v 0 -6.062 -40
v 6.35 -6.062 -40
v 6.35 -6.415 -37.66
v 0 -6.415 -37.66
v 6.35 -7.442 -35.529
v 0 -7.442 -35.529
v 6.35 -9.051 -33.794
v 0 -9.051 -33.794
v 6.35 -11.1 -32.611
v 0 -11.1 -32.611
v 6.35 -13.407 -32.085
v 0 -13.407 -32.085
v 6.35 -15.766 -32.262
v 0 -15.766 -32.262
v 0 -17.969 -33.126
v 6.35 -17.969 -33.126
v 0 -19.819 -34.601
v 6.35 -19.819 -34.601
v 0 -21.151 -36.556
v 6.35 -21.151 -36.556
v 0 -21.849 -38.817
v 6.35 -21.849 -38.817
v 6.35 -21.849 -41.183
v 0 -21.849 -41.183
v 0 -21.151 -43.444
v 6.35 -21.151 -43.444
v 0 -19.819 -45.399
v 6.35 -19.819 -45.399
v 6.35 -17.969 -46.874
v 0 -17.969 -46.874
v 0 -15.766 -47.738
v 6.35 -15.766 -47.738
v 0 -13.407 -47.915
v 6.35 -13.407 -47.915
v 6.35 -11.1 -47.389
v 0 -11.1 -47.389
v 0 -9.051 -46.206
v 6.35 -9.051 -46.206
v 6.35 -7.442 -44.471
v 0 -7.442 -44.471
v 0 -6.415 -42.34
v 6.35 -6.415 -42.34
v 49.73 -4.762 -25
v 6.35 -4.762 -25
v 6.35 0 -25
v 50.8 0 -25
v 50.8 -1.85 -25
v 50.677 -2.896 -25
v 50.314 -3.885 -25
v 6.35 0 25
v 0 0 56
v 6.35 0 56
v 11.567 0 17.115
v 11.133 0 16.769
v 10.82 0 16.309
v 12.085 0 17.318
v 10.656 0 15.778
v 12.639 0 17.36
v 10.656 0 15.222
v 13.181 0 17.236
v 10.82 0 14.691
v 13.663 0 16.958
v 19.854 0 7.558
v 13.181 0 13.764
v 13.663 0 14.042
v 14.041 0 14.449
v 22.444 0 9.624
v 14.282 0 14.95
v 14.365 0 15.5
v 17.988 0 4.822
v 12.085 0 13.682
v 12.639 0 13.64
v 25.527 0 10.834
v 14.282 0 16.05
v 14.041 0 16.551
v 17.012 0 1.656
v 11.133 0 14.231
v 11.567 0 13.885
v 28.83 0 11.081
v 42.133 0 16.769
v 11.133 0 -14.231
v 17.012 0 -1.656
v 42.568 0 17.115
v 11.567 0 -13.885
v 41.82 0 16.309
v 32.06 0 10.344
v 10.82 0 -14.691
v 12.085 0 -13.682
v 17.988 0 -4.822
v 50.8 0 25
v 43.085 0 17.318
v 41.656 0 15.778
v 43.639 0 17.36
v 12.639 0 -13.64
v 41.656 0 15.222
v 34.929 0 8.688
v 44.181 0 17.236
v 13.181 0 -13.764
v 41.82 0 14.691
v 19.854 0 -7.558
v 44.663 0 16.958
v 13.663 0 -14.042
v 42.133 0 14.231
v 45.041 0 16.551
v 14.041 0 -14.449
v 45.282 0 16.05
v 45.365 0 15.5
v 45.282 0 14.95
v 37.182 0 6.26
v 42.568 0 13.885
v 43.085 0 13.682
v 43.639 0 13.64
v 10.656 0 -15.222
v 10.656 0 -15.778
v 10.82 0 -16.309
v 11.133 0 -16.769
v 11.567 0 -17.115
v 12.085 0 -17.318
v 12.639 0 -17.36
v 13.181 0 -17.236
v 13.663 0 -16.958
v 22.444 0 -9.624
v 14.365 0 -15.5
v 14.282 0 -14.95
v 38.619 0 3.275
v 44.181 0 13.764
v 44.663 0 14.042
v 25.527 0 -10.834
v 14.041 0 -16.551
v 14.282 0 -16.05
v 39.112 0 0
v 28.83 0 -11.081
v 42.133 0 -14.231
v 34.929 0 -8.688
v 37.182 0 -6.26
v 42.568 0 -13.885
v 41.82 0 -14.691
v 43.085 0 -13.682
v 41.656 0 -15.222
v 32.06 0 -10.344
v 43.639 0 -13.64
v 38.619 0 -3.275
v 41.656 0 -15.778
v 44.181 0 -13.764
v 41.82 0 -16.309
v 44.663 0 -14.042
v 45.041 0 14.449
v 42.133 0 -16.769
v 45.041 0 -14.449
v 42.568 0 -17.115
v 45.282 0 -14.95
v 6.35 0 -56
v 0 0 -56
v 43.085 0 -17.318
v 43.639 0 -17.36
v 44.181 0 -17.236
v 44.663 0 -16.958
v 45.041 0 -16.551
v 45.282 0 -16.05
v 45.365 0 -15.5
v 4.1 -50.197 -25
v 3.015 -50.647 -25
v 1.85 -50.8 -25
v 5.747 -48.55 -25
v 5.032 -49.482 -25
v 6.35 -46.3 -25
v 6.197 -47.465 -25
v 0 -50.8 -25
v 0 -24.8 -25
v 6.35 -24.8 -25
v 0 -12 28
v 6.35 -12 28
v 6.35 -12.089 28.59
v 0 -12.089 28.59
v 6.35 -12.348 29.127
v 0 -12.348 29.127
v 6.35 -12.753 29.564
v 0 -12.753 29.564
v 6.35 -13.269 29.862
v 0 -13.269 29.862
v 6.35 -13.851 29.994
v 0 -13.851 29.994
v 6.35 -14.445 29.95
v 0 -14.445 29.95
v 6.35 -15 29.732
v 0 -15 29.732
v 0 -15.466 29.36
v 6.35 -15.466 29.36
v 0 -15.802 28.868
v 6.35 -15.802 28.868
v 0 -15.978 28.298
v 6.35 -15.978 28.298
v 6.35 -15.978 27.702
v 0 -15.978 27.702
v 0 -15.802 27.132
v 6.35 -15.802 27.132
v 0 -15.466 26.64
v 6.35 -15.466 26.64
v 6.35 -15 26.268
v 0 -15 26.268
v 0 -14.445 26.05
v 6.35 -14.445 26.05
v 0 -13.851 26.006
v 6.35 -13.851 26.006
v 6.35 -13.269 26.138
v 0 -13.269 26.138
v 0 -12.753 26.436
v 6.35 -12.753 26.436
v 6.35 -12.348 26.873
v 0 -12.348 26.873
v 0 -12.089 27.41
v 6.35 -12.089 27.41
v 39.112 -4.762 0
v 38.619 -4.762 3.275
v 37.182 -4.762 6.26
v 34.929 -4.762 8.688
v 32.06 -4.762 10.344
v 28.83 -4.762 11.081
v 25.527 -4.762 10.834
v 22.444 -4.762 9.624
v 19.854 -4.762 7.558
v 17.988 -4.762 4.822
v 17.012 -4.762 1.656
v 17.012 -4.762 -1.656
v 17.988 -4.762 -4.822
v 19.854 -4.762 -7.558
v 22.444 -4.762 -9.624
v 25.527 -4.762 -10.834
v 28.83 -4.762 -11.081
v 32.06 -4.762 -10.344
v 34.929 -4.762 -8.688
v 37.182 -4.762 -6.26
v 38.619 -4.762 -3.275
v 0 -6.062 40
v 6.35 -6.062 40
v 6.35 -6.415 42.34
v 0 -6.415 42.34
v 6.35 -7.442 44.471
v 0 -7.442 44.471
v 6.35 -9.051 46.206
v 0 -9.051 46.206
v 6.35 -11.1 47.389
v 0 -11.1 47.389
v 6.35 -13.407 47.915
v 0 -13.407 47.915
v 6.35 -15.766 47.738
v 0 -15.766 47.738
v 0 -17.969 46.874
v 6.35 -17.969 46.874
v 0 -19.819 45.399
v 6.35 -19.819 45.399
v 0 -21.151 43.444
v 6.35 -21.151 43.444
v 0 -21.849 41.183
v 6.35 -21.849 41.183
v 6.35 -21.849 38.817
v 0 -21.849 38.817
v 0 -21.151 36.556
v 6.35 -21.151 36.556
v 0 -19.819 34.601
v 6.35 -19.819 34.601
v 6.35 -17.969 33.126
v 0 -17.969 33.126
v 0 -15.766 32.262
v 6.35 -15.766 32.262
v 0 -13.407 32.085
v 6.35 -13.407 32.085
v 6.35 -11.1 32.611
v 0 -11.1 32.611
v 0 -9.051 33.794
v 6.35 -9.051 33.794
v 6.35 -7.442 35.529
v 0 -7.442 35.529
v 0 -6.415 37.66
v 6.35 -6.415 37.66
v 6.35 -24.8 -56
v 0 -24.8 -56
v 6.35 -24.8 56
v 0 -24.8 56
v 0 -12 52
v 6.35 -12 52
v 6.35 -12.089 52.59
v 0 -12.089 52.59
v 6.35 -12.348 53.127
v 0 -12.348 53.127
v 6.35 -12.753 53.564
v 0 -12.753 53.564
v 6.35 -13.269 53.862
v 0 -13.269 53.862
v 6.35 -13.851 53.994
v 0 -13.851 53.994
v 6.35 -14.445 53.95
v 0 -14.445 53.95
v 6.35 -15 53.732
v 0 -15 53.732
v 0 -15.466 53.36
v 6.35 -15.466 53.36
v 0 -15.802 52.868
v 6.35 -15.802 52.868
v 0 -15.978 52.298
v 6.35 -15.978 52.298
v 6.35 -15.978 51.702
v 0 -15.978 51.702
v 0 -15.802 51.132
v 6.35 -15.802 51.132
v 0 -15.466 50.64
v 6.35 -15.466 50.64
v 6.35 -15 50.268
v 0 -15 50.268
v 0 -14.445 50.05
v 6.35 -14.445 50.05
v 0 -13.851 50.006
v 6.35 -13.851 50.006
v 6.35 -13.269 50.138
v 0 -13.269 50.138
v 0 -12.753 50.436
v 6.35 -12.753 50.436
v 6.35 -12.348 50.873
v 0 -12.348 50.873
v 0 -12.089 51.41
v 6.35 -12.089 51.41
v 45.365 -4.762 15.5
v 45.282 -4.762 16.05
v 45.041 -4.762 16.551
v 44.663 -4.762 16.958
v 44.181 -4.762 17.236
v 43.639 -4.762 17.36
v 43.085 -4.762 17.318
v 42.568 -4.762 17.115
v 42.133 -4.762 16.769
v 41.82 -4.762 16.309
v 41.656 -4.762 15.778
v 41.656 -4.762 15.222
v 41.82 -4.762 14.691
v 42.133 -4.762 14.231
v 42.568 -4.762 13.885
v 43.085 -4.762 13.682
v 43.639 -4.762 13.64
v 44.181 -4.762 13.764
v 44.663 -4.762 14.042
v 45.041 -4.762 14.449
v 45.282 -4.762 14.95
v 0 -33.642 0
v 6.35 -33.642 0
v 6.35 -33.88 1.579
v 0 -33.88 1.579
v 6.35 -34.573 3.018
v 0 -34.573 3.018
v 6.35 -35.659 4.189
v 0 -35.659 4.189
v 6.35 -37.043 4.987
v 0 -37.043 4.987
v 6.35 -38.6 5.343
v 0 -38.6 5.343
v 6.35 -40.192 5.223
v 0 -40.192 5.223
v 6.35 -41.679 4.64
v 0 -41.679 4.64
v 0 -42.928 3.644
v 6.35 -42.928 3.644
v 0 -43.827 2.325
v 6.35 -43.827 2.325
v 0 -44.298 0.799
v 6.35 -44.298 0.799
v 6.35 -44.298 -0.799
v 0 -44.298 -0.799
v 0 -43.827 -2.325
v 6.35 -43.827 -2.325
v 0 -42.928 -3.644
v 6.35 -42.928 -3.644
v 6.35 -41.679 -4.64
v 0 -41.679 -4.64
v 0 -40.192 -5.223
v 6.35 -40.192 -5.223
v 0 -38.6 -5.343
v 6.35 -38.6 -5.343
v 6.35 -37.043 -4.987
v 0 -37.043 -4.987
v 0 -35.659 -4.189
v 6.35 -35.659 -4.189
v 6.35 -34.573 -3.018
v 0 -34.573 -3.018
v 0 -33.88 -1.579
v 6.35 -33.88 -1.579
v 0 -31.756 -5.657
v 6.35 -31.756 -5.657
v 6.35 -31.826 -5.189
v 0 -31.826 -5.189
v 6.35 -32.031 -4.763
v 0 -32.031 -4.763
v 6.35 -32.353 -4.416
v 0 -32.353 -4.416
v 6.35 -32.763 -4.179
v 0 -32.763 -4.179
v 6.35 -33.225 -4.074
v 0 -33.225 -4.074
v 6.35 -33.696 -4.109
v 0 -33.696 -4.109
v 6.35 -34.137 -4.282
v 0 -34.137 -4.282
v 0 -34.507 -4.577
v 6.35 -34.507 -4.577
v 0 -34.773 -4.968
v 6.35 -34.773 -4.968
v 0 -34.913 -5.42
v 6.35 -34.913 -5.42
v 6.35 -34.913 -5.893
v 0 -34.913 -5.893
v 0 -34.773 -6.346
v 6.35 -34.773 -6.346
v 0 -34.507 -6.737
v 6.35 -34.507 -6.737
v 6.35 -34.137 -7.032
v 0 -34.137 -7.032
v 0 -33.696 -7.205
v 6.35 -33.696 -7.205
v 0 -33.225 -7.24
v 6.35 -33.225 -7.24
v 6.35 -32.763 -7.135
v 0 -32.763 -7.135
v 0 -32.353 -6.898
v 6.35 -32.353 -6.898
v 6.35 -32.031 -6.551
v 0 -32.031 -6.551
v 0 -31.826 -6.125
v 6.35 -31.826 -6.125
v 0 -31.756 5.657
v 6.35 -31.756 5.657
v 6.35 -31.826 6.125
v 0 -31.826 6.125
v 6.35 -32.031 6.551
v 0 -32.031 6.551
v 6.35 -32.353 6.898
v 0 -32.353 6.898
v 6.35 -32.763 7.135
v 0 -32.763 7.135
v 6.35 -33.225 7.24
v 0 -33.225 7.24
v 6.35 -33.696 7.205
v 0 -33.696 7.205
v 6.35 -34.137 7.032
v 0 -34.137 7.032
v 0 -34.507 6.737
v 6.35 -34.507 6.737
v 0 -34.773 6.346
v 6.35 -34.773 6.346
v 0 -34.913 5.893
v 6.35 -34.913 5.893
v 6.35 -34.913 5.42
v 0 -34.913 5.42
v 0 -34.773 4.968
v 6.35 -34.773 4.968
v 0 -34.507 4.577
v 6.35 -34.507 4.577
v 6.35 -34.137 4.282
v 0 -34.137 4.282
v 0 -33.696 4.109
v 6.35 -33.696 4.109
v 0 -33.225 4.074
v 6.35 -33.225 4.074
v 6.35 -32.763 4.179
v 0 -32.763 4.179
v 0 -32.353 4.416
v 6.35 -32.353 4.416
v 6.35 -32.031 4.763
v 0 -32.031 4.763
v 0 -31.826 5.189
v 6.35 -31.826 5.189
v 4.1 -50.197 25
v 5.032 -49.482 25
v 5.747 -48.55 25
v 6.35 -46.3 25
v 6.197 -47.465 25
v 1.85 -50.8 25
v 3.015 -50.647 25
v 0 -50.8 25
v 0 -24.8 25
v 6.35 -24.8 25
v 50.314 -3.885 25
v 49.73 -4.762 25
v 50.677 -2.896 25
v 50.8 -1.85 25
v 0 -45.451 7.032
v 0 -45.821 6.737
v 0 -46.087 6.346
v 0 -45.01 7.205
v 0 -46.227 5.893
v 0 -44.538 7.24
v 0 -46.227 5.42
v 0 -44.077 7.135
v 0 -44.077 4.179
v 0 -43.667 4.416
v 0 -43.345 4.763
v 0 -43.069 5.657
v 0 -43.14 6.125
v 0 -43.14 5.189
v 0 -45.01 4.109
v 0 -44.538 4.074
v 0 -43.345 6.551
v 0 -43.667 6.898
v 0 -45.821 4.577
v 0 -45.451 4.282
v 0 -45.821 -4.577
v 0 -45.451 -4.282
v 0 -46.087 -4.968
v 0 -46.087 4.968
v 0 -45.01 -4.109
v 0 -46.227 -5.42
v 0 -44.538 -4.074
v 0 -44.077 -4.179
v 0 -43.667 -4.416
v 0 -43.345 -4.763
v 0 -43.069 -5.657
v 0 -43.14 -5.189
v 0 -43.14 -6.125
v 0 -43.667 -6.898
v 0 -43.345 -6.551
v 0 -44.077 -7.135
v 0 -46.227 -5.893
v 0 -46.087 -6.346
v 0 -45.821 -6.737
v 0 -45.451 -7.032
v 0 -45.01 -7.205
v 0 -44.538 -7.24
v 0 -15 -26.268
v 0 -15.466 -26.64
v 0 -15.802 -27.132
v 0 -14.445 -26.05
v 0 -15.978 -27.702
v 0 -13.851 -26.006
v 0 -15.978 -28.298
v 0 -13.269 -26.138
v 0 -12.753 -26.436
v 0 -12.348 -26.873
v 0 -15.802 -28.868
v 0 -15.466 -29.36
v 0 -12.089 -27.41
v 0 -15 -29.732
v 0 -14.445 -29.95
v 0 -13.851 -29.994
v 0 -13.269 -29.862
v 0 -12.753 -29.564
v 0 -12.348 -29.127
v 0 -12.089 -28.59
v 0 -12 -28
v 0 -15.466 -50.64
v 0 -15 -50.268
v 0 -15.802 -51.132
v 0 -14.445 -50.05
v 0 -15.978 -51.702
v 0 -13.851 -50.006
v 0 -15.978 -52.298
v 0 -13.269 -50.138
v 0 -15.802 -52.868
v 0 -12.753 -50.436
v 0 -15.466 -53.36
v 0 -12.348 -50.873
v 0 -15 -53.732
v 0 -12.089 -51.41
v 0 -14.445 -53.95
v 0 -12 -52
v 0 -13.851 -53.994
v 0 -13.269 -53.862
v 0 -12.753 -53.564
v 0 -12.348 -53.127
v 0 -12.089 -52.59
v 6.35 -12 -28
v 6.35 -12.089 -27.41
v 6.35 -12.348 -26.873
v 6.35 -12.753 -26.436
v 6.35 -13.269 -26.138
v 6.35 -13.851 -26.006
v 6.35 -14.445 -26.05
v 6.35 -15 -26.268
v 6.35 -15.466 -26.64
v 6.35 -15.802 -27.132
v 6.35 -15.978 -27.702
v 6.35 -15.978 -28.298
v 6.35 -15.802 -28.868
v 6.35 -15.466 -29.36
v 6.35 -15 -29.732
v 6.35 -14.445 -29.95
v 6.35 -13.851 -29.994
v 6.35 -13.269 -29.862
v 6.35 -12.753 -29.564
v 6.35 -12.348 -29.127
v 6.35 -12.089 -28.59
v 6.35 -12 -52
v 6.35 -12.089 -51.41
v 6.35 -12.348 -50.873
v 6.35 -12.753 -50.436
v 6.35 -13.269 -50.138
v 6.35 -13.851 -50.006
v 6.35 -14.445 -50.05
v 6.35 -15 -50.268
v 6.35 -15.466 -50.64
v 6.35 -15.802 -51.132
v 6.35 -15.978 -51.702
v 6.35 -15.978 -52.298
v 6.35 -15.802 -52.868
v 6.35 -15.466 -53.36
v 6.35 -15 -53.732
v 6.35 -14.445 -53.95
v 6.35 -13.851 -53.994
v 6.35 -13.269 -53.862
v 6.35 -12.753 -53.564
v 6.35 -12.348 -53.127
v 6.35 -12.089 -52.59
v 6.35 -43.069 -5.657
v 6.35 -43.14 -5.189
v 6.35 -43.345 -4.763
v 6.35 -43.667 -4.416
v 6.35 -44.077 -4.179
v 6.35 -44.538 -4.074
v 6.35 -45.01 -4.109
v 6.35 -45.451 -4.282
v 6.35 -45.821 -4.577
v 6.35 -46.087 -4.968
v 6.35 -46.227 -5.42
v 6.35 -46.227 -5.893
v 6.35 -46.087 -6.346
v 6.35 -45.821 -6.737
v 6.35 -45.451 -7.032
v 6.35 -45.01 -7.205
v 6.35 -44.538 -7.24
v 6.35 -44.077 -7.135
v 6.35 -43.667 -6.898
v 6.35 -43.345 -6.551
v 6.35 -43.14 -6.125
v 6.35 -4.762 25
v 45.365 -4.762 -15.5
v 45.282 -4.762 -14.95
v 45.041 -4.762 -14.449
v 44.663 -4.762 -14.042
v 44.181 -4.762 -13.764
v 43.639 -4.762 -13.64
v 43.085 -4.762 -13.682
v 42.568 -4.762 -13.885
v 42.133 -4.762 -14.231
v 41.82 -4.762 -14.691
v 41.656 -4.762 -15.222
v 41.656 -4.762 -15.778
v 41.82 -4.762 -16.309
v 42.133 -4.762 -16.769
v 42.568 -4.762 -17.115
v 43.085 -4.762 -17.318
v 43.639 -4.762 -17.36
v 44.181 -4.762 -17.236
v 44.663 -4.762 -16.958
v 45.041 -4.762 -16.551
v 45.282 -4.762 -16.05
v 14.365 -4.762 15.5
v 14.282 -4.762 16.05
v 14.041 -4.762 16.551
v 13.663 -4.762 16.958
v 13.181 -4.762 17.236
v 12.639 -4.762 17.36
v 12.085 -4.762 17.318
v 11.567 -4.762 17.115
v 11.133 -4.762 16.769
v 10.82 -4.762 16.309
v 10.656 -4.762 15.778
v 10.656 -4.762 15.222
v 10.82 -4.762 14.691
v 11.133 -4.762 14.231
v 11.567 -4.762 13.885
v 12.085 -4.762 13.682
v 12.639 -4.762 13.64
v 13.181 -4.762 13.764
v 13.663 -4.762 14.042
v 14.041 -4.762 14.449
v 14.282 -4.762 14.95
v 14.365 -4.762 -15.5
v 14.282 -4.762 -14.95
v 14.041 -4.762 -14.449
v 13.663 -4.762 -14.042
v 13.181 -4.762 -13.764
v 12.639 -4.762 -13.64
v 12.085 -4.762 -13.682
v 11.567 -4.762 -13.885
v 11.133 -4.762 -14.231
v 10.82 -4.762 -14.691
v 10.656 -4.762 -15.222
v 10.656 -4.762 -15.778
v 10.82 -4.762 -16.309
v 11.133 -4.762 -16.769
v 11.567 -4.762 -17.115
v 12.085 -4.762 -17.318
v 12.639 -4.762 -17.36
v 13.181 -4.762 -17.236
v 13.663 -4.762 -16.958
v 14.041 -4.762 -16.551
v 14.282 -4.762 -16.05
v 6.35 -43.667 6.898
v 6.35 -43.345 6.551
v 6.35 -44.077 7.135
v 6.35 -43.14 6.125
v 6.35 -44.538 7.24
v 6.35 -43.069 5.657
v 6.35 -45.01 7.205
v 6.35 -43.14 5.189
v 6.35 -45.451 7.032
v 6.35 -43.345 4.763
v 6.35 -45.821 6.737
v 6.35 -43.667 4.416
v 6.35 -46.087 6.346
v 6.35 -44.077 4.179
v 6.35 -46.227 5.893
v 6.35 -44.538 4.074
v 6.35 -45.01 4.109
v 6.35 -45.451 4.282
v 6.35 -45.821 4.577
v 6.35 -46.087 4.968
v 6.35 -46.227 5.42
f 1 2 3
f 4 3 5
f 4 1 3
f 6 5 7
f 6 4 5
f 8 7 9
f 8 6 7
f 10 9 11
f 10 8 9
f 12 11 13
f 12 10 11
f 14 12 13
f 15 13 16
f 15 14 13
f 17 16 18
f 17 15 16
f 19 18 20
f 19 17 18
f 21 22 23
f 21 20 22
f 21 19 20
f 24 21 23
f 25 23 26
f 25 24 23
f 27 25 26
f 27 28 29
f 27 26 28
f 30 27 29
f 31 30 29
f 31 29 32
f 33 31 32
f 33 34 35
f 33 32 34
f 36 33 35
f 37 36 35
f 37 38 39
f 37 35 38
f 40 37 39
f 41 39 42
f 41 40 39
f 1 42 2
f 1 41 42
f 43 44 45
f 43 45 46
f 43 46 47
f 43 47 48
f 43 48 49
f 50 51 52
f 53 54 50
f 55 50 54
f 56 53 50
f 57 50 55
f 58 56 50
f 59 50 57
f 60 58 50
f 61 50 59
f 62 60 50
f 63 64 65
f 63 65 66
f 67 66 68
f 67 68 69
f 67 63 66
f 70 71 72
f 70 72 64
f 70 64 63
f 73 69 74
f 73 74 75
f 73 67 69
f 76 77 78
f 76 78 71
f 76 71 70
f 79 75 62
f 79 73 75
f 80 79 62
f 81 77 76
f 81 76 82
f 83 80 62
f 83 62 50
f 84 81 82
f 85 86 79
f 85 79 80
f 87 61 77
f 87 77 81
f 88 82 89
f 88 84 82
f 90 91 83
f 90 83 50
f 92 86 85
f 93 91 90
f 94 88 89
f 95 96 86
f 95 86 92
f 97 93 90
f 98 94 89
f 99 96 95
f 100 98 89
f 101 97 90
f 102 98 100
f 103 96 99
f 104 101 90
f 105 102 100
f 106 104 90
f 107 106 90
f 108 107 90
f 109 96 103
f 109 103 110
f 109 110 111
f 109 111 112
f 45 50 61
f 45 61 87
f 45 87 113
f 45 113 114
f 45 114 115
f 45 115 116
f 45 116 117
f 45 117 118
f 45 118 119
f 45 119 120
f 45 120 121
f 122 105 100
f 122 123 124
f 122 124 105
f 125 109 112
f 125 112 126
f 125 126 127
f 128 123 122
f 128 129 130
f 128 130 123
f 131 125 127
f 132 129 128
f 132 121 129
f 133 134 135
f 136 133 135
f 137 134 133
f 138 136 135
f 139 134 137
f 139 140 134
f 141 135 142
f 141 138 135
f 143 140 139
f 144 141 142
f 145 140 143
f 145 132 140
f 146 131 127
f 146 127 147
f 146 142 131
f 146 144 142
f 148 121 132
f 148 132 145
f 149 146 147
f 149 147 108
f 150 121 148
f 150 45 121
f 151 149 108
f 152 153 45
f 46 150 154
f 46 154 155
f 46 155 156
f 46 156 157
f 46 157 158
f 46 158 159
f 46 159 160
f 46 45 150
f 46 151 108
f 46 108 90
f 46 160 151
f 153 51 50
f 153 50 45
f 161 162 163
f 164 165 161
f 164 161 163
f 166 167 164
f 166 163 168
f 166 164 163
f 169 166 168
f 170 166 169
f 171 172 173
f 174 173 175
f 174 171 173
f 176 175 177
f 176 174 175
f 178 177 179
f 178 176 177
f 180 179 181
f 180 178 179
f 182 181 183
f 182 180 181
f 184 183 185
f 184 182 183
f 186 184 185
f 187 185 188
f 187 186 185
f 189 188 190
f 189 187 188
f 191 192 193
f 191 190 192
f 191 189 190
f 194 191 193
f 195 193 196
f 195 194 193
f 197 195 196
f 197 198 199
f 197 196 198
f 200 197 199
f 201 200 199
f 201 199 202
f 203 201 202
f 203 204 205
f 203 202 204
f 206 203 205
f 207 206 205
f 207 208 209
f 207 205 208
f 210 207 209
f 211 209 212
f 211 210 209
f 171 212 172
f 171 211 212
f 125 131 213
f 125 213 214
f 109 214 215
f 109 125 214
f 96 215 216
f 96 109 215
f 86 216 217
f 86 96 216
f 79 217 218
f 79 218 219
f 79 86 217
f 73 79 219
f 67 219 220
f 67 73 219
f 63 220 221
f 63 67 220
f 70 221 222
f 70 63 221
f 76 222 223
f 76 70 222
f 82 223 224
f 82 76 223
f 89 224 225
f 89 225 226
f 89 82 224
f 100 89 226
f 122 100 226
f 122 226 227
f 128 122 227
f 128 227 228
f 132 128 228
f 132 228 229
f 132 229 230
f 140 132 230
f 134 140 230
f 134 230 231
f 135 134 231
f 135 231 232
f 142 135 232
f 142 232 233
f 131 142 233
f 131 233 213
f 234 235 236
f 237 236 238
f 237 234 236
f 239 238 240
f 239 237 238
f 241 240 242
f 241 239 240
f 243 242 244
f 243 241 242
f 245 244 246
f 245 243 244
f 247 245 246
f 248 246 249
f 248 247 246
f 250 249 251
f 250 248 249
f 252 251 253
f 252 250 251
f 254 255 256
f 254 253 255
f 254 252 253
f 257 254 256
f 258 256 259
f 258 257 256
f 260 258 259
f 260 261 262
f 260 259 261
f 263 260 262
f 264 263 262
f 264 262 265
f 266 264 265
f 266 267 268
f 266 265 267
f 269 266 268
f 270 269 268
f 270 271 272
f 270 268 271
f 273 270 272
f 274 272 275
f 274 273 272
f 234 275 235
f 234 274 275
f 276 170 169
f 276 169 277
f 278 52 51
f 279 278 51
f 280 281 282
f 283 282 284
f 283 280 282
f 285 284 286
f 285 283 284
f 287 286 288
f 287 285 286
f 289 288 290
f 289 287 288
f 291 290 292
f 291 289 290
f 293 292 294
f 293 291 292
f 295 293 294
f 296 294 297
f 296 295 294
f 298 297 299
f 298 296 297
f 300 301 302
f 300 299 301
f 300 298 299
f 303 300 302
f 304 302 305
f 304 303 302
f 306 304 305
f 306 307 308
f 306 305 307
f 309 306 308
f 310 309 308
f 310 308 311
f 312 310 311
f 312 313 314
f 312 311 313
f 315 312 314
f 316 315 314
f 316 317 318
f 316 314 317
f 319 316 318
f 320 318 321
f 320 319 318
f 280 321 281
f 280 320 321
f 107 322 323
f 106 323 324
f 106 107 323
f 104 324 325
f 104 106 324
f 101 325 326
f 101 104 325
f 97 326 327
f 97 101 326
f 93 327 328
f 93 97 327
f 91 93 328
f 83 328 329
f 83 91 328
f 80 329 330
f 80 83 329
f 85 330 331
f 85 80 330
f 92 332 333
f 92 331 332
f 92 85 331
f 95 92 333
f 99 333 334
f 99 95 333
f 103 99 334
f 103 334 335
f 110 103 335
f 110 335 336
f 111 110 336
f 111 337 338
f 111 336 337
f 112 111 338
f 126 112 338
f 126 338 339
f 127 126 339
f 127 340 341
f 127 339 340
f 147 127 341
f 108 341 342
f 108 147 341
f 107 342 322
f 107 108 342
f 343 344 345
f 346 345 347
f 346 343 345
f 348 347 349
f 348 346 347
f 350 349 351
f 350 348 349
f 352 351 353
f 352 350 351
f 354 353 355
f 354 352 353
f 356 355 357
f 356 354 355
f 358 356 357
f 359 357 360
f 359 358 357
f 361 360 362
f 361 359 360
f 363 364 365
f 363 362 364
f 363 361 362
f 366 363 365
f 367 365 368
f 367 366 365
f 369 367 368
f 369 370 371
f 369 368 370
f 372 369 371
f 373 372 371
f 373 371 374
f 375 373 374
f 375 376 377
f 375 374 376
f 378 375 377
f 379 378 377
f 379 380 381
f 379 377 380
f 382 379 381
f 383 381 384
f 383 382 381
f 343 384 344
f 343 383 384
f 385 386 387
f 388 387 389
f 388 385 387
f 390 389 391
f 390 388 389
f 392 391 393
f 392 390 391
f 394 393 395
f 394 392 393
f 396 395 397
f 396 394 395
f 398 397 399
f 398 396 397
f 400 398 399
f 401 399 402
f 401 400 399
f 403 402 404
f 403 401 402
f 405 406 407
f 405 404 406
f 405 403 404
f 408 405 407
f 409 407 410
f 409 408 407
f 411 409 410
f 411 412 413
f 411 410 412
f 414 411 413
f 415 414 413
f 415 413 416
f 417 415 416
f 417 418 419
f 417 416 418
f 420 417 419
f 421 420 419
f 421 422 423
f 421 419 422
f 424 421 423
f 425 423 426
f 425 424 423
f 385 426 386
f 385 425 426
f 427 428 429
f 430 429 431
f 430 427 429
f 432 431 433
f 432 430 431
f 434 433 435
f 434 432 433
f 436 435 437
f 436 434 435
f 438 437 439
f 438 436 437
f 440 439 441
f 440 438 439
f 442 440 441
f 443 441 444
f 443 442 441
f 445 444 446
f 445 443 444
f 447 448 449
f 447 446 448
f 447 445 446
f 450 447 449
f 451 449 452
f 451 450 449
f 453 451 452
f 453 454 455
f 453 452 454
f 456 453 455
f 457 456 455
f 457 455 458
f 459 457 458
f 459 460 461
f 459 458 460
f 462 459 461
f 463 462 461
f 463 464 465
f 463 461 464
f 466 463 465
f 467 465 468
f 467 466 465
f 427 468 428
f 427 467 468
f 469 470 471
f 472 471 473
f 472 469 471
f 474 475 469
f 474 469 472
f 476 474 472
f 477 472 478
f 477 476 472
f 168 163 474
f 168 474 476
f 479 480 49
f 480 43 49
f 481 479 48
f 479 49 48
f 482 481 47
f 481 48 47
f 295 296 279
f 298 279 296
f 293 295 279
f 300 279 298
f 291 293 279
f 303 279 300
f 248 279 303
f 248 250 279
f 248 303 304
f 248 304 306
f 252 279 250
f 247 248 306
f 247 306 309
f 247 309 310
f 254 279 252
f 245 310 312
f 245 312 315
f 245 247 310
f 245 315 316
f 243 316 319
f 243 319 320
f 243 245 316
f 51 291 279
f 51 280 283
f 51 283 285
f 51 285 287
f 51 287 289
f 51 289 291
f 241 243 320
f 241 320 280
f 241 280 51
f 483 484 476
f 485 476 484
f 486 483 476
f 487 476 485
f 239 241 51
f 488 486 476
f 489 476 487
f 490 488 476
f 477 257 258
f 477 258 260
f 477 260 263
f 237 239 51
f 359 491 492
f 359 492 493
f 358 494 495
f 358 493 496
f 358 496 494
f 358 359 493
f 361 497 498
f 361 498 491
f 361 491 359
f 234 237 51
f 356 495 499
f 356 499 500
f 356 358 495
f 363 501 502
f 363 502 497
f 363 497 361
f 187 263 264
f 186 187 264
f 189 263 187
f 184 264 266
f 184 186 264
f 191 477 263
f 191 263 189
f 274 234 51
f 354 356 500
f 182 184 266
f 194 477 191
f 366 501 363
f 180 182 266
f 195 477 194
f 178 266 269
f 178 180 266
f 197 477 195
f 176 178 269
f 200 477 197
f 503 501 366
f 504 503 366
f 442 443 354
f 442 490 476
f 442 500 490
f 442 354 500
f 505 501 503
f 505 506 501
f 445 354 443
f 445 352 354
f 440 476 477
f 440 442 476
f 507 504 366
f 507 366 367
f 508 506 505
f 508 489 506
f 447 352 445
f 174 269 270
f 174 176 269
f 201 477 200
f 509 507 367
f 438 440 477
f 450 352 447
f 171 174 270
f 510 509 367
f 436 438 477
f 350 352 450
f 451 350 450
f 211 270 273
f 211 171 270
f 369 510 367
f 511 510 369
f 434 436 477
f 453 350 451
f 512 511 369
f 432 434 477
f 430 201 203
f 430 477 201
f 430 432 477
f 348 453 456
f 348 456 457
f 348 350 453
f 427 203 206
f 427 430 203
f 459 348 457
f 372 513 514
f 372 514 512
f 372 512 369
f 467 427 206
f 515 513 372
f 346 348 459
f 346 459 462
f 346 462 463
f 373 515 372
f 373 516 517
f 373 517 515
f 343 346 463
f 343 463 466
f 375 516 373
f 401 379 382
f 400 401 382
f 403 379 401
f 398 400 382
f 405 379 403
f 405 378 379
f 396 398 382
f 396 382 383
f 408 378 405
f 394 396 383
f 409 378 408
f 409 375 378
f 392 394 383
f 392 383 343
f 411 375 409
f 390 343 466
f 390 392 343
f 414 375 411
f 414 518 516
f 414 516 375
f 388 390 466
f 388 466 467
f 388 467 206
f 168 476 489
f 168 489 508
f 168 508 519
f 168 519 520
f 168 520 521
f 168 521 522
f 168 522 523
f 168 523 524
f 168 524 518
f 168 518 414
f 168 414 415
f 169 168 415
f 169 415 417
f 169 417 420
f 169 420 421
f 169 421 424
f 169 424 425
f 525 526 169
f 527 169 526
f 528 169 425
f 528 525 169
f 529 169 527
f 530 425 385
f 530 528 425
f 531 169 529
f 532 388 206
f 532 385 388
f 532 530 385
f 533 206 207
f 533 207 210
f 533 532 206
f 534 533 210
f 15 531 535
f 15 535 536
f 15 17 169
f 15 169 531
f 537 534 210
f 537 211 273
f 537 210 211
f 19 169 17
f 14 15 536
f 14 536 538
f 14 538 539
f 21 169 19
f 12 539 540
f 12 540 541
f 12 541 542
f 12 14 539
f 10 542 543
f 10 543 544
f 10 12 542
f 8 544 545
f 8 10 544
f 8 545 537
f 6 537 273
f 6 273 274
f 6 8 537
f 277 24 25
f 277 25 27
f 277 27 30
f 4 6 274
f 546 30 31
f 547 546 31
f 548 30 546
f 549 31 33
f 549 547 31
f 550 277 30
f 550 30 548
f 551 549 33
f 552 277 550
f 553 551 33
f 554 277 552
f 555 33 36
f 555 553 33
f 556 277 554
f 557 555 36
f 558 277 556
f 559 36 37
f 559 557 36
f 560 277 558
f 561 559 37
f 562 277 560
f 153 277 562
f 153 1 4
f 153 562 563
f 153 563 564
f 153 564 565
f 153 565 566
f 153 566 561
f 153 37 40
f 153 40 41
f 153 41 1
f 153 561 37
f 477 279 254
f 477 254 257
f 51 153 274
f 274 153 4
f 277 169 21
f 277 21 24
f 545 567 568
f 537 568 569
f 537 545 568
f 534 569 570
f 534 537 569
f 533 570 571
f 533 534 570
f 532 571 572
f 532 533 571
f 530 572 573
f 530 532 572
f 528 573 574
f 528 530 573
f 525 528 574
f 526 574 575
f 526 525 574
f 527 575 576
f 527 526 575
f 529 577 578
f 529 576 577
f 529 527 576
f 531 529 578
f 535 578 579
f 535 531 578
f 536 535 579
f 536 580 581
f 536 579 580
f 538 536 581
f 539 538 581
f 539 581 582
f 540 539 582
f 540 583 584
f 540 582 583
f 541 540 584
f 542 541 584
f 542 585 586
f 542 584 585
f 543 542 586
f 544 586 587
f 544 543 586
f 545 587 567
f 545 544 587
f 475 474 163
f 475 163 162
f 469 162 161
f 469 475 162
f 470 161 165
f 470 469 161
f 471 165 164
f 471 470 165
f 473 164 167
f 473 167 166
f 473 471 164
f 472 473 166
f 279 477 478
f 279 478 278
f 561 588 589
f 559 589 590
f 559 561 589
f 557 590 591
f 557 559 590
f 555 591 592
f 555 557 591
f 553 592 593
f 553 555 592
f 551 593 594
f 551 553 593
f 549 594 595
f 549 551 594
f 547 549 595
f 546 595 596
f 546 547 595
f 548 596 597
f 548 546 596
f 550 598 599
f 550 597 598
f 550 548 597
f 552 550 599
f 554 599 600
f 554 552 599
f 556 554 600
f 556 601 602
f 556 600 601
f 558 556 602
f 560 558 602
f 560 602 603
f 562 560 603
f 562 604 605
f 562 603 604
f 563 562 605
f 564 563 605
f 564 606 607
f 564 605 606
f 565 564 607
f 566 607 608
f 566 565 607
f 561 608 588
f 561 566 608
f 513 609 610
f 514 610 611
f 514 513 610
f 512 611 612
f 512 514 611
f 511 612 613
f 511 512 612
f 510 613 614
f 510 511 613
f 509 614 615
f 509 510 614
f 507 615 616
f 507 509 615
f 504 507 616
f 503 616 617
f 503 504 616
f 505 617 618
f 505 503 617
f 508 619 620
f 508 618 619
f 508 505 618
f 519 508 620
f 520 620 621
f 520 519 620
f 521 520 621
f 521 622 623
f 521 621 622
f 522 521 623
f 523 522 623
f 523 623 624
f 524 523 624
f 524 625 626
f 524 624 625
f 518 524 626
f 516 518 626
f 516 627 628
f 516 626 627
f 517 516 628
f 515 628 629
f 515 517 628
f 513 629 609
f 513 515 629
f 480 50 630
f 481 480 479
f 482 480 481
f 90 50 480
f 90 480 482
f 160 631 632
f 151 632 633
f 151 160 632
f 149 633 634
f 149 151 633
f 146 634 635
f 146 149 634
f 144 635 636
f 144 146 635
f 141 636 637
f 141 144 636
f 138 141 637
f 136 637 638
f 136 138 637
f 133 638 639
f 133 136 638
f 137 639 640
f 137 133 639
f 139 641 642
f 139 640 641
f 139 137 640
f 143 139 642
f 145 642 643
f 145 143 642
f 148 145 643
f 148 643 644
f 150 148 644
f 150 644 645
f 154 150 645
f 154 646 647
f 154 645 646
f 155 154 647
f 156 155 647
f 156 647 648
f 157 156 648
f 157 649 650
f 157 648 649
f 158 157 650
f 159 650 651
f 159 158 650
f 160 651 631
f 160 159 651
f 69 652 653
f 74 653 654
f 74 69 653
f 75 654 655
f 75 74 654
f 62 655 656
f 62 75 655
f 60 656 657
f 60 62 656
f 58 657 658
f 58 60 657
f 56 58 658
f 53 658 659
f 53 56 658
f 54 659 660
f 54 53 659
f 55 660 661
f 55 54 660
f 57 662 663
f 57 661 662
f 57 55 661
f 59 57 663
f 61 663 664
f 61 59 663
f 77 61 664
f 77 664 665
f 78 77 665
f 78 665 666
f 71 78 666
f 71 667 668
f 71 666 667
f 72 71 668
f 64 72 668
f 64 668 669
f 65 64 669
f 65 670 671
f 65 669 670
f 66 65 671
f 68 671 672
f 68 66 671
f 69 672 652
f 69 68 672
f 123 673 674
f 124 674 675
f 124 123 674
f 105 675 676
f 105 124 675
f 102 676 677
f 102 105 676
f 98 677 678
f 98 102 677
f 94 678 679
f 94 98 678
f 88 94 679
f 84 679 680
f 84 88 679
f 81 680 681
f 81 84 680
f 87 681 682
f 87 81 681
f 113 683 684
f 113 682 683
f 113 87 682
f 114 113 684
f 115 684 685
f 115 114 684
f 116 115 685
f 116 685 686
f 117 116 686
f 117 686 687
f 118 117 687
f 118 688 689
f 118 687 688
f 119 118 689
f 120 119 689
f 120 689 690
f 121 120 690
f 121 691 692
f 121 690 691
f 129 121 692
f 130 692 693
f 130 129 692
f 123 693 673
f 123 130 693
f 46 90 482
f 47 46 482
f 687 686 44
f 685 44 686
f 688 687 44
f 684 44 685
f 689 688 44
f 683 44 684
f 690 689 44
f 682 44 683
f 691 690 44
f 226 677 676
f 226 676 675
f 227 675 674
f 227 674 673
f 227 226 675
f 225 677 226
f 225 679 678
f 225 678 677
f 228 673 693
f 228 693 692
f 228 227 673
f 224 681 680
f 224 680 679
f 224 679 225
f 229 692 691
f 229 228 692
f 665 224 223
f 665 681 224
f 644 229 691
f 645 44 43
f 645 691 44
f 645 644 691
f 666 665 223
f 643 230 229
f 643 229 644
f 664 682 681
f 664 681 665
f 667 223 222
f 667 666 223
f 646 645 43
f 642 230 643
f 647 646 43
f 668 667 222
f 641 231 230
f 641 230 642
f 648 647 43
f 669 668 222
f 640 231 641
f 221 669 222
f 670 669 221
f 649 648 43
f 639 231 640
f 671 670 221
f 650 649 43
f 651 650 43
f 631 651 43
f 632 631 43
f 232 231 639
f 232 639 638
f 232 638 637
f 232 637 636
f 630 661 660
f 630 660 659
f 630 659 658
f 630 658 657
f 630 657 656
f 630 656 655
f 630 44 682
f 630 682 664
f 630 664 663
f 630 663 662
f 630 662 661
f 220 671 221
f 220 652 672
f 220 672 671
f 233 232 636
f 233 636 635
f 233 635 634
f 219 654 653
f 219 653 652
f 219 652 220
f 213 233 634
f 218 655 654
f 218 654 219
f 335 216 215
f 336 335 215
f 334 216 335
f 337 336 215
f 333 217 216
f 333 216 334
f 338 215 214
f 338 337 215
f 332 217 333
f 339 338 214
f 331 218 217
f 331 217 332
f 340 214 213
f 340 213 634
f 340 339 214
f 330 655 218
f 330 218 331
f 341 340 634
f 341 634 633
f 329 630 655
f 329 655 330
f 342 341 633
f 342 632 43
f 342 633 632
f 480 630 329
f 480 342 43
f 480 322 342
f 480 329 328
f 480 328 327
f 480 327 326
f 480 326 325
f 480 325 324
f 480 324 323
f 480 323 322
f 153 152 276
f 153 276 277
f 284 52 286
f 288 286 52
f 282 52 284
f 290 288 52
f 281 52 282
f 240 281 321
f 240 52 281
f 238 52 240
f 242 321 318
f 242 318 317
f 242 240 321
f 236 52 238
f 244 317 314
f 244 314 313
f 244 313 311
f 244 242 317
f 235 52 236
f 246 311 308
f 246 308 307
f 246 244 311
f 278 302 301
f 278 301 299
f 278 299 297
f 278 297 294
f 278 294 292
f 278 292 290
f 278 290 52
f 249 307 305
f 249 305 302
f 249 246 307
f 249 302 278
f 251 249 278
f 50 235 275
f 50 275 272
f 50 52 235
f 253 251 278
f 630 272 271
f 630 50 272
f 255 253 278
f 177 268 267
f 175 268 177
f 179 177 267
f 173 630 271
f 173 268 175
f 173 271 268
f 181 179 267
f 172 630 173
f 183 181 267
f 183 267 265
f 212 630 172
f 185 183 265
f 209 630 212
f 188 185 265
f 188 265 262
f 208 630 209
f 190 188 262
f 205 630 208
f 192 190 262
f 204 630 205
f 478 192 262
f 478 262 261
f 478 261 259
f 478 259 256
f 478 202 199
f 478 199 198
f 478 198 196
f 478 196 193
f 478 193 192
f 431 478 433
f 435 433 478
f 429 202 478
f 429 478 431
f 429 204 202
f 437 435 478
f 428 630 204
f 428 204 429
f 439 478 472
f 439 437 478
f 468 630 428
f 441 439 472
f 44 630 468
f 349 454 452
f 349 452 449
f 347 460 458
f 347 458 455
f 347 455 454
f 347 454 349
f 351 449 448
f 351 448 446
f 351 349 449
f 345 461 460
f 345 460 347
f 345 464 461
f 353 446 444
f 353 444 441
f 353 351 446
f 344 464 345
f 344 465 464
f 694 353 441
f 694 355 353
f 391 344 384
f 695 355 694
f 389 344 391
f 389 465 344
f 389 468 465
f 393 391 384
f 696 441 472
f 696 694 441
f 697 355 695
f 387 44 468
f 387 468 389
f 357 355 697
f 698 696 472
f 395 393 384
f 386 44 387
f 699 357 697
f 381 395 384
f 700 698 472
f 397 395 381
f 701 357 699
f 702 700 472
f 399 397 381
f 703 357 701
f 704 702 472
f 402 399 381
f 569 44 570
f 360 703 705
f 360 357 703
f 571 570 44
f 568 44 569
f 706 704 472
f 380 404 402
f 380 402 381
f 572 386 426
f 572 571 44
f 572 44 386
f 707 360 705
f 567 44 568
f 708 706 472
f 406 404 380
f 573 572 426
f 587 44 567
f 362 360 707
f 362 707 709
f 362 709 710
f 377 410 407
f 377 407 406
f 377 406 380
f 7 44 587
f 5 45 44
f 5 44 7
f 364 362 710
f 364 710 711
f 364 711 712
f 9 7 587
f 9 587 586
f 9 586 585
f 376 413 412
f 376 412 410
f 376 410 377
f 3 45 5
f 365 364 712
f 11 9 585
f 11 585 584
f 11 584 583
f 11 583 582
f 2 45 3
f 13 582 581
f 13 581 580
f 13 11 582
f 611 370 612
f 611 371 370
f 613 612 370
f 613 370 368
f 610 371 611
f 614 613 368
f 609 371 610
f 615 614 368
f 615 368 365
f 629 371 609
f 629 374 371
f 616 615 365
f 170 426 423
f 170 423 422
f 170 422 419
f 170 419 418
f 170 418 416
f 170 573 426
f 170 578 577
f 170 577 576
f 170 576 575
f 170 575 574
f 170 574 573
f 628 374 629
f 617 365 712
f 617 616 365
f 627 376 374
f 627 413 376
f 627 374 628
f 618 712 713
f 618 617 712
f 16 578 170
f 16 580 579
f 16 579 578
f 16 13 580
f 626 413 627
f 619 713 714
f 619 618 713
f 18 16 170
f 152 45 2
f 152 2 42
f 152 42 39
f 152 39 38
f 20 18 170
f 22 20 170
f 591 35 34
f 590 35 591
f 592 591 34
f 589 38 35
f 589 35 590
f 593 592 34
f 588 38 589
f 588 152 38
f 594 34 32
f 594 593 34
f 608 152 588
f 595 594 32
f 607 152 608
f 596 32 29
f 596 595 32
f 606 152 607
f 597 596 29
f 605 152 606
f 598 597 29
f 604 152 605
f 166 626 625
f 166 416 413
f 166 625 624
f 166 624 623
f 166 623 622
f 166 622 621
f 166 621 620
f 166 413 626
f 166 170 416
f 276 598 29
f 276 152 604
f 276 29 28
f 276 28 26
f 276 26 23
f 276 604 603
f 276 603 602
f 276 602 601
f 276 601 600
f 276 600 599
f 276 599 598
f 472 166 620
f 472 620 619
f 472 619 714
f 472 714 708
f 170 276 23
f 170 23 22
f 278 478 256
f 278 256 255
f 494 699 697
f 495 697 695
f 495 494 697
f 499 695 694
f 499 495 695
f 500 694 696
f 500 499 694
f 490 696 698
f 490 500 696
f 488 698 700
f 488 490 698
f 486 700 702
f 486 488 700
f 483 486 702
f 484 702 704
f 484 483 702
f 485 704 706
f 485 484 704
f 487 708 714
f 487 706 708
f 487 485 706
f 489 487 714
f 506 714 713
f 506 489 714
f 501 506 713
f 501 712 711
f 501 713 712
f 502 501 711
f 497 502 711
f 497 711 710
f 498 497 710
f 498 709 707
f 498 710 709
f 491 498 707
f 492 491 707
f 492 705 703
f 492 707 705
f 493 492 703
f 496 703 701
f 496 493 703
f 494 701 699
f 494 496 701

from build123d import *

# Parameters (mm, degrees)
PAD_DEPTH            = 56
PAD001_DEPTH         = 56
FILLET_R             = 4.5
SKETCH001_R          = 7.9375
SKETCH001_R_2        = 2
POCKET_DEPTH         = 50.801
LINEARPATTERN_COUNT  = 2
LINEARPATTERN_PITCH  = 80
SKETCH002_R          = 5.357812
SKETCH002_R_2        = 1.5875
POCKET001_DEPTH      = 50.801
POCKET001_DEPTH_BACK = 0.001
SKETCH003_W          = 60
SKETCH003_H          = 51.1187
POCKET002_DEPTH      = 266.123378
POCKET002_DEPTH_BACK = 316.923378
SKETCH004_R          = 1.865
SKETCH004_R_2        = 11.1125
POCKET003_DEPTH      = 0.001
POCKET003_DEPTH_BACK = 50.801
SKETCH005_W          = 60
SKETCH005_H          = 12.25
POCKET004_DEPTH      = 56.001
POCKET004_DEPTH_BACK = 56.001
SKETCH006_W          = 37.3666
SKETCH006_H          = 44.7638
POCKET005_DEPTH      = 266.123378
POCKET005_DEPTH_BACK = 316.923378


with BuildPart() as part:
    # Sketch → Pad (new body)
    with BuildSketch(Plane.XY):
        Polygon((0, 0), (50.8, 0), (50.8, -6.35), (6.35, -6.35), (6.35, -50.8), (0, -50.8), align=None)
    extrude(amount=-PAD_DEPTH)

    # Sketch → Pad001 (join)
    with BuildSketch(Plane.XY):
        Polygon((0, 0), (50.8, 0), (50.8, -6.35), (6.35, -6.35), (6.35, -50.8), (0, -50.8), align=None)
    extrude(amount=PAD001_DEPTH)

    # Fillet
    fillet_edges = [part.edges().sort_by_distance(p)[0] for p in [
        (6.35, -50.8, 0),
        (6.35, -6.35, 0),
        (50.8, -6.35, 0),
    ]]
    fillet(fillet_edges, radius=FILLET_R)

    # Sketch001 → Pocket (cut, through all)
    with BuildSketch(Plane.YZ):
        with Locations((-14, -40)):
            Circle(SKETCH001_R)
        with Locations((-14, -28)):
            Circle(SKETCH001_R_2)
        with Locations((-14, -52)):
            Circle(SKETCH001_R_2)
    pocket = extrude(amount=POCKET_DEPTH, mode=Mode.SUBTRACT)

    # LinearPattern: Pocket ×2
    with Locations(*[(0, 0, i * LINEARPATTERN_PITCH) for i in range(1, LINEARPATTERN_COUNT)]):
        add(pocket, mode=Mode.SUBTRACT)

    # Sketch002 → Pocket001 (cut, two sides)
    with BuildSketch(Plane.YZ) as pocket001_sk:
        with Locations((-39, 0)):
            Circle(SKETCH002_R)
        with Locations((-44.656854, 5.656854)):
            Circle(SKETCH002_R_2)
        with Locations((-33.343146, 5.656854)):
            Circle(SKETCH002_R_2)
        with Locations((-33.343146, -5.656854)):
            Circle(SKETCH002_R_2)
        with Locations((-44.656854, -5.656854)):
            Circle(SKETCH002_R_2)
    extrude(amount=POCKET001_DEPTH, mode=Mode.SUBTRACT)
    extrude(pocket001_sk.sketch, amount=-POCKET001_DEPTH_BACK, mode=Mode.SUBTRACT)

    # Sketch003 → Pocket002 (cut, two sides)
    with BuildSketch(Plane.XZ) as pocket002_sk:
        with Locations((36.35, 50.55935)):
            Rectangle(SKETCH003_W, SKETCH003_H)
    pocket002 = extrude(amount=-POCKET002_DEPTH, mode=Mode.SUBTRACT) + extrude(pocket002_sk.sketch, amount=POCKET002_DEPTH_BACK, mode=Mode.SUBTRACT)

    # Mirrored001: Pocket002 across Sketch003 H_Axis
    add(pocket002.mirror(Plane(origin=(0, 0, 0), x_dir=(0, -1, 0), z_dir=(0, 0, 1))), mode=Mode.SUBTRACT)

    # Sketch004 → Pocket003 (cut, two sides)
    with BuildSketch(Plane.XZ) as pocket003_sk:
        with Locations((43.5, 15.5)):
            Circle(SKETCH004_R)
        with Locations((43.5, -15.5)):
            Circle(SKETCH004_R)
        with Locations((12.5, 15.5)):
            Circle(SKETCH004_R)
        with Locations((12.5, -15.5)):
            Circle(SKETCH004_R)
        with Locations((28, 0)):
            Circle(SKETCH004_R_2)
    extrude(amount=-POCKET003_DEPTH, mode=Mode.SUBTRACT)
    extrude(pocket003_sk.sketch, amount=POCKET003_DEPTH_BACK, mode=Mode.SUBTRACT)

    # Sketch005 → Pocket004 (cut, two sides)
    with BuildSketch(Plane.XY) as pocket004_sk:
        with Locations((36.35, -10.8875)):
            Rectangle(SKETCH005_W, SKETCH005_H)
    extrude(amount=-POCKET004_DEPTH, mode=Mode.SUBTRACT)
    extrude(pocket004_sk.sketch, amount=POCKET004_DEPTH_BACK, mode=Mode.SUBTRACT)

    # Sketch006 → Pocket005 (cut, two sides)
    with BuildSketch(Plane.YZ) as pocket005_sk:
        with Locations((-43.4833, 47.3819)):
            Rectangle(SKETCH006_W, SKETCH006_H)
    pocket005 = extrude(amount=-POCKET005_DEPTH, mode=Mode.SUBTRACT) + extrude(pocket005_sk.sketch, amount=POCKET005_DEPTH_BACK, mode=Mode.SUBTRACT)

    # Mirrored: Pocket005 across Sketch006 H_Axis
    add(pocket005.mirror(Plane.XY), mode=Mode.SUBTRACT)


solid = part.part
